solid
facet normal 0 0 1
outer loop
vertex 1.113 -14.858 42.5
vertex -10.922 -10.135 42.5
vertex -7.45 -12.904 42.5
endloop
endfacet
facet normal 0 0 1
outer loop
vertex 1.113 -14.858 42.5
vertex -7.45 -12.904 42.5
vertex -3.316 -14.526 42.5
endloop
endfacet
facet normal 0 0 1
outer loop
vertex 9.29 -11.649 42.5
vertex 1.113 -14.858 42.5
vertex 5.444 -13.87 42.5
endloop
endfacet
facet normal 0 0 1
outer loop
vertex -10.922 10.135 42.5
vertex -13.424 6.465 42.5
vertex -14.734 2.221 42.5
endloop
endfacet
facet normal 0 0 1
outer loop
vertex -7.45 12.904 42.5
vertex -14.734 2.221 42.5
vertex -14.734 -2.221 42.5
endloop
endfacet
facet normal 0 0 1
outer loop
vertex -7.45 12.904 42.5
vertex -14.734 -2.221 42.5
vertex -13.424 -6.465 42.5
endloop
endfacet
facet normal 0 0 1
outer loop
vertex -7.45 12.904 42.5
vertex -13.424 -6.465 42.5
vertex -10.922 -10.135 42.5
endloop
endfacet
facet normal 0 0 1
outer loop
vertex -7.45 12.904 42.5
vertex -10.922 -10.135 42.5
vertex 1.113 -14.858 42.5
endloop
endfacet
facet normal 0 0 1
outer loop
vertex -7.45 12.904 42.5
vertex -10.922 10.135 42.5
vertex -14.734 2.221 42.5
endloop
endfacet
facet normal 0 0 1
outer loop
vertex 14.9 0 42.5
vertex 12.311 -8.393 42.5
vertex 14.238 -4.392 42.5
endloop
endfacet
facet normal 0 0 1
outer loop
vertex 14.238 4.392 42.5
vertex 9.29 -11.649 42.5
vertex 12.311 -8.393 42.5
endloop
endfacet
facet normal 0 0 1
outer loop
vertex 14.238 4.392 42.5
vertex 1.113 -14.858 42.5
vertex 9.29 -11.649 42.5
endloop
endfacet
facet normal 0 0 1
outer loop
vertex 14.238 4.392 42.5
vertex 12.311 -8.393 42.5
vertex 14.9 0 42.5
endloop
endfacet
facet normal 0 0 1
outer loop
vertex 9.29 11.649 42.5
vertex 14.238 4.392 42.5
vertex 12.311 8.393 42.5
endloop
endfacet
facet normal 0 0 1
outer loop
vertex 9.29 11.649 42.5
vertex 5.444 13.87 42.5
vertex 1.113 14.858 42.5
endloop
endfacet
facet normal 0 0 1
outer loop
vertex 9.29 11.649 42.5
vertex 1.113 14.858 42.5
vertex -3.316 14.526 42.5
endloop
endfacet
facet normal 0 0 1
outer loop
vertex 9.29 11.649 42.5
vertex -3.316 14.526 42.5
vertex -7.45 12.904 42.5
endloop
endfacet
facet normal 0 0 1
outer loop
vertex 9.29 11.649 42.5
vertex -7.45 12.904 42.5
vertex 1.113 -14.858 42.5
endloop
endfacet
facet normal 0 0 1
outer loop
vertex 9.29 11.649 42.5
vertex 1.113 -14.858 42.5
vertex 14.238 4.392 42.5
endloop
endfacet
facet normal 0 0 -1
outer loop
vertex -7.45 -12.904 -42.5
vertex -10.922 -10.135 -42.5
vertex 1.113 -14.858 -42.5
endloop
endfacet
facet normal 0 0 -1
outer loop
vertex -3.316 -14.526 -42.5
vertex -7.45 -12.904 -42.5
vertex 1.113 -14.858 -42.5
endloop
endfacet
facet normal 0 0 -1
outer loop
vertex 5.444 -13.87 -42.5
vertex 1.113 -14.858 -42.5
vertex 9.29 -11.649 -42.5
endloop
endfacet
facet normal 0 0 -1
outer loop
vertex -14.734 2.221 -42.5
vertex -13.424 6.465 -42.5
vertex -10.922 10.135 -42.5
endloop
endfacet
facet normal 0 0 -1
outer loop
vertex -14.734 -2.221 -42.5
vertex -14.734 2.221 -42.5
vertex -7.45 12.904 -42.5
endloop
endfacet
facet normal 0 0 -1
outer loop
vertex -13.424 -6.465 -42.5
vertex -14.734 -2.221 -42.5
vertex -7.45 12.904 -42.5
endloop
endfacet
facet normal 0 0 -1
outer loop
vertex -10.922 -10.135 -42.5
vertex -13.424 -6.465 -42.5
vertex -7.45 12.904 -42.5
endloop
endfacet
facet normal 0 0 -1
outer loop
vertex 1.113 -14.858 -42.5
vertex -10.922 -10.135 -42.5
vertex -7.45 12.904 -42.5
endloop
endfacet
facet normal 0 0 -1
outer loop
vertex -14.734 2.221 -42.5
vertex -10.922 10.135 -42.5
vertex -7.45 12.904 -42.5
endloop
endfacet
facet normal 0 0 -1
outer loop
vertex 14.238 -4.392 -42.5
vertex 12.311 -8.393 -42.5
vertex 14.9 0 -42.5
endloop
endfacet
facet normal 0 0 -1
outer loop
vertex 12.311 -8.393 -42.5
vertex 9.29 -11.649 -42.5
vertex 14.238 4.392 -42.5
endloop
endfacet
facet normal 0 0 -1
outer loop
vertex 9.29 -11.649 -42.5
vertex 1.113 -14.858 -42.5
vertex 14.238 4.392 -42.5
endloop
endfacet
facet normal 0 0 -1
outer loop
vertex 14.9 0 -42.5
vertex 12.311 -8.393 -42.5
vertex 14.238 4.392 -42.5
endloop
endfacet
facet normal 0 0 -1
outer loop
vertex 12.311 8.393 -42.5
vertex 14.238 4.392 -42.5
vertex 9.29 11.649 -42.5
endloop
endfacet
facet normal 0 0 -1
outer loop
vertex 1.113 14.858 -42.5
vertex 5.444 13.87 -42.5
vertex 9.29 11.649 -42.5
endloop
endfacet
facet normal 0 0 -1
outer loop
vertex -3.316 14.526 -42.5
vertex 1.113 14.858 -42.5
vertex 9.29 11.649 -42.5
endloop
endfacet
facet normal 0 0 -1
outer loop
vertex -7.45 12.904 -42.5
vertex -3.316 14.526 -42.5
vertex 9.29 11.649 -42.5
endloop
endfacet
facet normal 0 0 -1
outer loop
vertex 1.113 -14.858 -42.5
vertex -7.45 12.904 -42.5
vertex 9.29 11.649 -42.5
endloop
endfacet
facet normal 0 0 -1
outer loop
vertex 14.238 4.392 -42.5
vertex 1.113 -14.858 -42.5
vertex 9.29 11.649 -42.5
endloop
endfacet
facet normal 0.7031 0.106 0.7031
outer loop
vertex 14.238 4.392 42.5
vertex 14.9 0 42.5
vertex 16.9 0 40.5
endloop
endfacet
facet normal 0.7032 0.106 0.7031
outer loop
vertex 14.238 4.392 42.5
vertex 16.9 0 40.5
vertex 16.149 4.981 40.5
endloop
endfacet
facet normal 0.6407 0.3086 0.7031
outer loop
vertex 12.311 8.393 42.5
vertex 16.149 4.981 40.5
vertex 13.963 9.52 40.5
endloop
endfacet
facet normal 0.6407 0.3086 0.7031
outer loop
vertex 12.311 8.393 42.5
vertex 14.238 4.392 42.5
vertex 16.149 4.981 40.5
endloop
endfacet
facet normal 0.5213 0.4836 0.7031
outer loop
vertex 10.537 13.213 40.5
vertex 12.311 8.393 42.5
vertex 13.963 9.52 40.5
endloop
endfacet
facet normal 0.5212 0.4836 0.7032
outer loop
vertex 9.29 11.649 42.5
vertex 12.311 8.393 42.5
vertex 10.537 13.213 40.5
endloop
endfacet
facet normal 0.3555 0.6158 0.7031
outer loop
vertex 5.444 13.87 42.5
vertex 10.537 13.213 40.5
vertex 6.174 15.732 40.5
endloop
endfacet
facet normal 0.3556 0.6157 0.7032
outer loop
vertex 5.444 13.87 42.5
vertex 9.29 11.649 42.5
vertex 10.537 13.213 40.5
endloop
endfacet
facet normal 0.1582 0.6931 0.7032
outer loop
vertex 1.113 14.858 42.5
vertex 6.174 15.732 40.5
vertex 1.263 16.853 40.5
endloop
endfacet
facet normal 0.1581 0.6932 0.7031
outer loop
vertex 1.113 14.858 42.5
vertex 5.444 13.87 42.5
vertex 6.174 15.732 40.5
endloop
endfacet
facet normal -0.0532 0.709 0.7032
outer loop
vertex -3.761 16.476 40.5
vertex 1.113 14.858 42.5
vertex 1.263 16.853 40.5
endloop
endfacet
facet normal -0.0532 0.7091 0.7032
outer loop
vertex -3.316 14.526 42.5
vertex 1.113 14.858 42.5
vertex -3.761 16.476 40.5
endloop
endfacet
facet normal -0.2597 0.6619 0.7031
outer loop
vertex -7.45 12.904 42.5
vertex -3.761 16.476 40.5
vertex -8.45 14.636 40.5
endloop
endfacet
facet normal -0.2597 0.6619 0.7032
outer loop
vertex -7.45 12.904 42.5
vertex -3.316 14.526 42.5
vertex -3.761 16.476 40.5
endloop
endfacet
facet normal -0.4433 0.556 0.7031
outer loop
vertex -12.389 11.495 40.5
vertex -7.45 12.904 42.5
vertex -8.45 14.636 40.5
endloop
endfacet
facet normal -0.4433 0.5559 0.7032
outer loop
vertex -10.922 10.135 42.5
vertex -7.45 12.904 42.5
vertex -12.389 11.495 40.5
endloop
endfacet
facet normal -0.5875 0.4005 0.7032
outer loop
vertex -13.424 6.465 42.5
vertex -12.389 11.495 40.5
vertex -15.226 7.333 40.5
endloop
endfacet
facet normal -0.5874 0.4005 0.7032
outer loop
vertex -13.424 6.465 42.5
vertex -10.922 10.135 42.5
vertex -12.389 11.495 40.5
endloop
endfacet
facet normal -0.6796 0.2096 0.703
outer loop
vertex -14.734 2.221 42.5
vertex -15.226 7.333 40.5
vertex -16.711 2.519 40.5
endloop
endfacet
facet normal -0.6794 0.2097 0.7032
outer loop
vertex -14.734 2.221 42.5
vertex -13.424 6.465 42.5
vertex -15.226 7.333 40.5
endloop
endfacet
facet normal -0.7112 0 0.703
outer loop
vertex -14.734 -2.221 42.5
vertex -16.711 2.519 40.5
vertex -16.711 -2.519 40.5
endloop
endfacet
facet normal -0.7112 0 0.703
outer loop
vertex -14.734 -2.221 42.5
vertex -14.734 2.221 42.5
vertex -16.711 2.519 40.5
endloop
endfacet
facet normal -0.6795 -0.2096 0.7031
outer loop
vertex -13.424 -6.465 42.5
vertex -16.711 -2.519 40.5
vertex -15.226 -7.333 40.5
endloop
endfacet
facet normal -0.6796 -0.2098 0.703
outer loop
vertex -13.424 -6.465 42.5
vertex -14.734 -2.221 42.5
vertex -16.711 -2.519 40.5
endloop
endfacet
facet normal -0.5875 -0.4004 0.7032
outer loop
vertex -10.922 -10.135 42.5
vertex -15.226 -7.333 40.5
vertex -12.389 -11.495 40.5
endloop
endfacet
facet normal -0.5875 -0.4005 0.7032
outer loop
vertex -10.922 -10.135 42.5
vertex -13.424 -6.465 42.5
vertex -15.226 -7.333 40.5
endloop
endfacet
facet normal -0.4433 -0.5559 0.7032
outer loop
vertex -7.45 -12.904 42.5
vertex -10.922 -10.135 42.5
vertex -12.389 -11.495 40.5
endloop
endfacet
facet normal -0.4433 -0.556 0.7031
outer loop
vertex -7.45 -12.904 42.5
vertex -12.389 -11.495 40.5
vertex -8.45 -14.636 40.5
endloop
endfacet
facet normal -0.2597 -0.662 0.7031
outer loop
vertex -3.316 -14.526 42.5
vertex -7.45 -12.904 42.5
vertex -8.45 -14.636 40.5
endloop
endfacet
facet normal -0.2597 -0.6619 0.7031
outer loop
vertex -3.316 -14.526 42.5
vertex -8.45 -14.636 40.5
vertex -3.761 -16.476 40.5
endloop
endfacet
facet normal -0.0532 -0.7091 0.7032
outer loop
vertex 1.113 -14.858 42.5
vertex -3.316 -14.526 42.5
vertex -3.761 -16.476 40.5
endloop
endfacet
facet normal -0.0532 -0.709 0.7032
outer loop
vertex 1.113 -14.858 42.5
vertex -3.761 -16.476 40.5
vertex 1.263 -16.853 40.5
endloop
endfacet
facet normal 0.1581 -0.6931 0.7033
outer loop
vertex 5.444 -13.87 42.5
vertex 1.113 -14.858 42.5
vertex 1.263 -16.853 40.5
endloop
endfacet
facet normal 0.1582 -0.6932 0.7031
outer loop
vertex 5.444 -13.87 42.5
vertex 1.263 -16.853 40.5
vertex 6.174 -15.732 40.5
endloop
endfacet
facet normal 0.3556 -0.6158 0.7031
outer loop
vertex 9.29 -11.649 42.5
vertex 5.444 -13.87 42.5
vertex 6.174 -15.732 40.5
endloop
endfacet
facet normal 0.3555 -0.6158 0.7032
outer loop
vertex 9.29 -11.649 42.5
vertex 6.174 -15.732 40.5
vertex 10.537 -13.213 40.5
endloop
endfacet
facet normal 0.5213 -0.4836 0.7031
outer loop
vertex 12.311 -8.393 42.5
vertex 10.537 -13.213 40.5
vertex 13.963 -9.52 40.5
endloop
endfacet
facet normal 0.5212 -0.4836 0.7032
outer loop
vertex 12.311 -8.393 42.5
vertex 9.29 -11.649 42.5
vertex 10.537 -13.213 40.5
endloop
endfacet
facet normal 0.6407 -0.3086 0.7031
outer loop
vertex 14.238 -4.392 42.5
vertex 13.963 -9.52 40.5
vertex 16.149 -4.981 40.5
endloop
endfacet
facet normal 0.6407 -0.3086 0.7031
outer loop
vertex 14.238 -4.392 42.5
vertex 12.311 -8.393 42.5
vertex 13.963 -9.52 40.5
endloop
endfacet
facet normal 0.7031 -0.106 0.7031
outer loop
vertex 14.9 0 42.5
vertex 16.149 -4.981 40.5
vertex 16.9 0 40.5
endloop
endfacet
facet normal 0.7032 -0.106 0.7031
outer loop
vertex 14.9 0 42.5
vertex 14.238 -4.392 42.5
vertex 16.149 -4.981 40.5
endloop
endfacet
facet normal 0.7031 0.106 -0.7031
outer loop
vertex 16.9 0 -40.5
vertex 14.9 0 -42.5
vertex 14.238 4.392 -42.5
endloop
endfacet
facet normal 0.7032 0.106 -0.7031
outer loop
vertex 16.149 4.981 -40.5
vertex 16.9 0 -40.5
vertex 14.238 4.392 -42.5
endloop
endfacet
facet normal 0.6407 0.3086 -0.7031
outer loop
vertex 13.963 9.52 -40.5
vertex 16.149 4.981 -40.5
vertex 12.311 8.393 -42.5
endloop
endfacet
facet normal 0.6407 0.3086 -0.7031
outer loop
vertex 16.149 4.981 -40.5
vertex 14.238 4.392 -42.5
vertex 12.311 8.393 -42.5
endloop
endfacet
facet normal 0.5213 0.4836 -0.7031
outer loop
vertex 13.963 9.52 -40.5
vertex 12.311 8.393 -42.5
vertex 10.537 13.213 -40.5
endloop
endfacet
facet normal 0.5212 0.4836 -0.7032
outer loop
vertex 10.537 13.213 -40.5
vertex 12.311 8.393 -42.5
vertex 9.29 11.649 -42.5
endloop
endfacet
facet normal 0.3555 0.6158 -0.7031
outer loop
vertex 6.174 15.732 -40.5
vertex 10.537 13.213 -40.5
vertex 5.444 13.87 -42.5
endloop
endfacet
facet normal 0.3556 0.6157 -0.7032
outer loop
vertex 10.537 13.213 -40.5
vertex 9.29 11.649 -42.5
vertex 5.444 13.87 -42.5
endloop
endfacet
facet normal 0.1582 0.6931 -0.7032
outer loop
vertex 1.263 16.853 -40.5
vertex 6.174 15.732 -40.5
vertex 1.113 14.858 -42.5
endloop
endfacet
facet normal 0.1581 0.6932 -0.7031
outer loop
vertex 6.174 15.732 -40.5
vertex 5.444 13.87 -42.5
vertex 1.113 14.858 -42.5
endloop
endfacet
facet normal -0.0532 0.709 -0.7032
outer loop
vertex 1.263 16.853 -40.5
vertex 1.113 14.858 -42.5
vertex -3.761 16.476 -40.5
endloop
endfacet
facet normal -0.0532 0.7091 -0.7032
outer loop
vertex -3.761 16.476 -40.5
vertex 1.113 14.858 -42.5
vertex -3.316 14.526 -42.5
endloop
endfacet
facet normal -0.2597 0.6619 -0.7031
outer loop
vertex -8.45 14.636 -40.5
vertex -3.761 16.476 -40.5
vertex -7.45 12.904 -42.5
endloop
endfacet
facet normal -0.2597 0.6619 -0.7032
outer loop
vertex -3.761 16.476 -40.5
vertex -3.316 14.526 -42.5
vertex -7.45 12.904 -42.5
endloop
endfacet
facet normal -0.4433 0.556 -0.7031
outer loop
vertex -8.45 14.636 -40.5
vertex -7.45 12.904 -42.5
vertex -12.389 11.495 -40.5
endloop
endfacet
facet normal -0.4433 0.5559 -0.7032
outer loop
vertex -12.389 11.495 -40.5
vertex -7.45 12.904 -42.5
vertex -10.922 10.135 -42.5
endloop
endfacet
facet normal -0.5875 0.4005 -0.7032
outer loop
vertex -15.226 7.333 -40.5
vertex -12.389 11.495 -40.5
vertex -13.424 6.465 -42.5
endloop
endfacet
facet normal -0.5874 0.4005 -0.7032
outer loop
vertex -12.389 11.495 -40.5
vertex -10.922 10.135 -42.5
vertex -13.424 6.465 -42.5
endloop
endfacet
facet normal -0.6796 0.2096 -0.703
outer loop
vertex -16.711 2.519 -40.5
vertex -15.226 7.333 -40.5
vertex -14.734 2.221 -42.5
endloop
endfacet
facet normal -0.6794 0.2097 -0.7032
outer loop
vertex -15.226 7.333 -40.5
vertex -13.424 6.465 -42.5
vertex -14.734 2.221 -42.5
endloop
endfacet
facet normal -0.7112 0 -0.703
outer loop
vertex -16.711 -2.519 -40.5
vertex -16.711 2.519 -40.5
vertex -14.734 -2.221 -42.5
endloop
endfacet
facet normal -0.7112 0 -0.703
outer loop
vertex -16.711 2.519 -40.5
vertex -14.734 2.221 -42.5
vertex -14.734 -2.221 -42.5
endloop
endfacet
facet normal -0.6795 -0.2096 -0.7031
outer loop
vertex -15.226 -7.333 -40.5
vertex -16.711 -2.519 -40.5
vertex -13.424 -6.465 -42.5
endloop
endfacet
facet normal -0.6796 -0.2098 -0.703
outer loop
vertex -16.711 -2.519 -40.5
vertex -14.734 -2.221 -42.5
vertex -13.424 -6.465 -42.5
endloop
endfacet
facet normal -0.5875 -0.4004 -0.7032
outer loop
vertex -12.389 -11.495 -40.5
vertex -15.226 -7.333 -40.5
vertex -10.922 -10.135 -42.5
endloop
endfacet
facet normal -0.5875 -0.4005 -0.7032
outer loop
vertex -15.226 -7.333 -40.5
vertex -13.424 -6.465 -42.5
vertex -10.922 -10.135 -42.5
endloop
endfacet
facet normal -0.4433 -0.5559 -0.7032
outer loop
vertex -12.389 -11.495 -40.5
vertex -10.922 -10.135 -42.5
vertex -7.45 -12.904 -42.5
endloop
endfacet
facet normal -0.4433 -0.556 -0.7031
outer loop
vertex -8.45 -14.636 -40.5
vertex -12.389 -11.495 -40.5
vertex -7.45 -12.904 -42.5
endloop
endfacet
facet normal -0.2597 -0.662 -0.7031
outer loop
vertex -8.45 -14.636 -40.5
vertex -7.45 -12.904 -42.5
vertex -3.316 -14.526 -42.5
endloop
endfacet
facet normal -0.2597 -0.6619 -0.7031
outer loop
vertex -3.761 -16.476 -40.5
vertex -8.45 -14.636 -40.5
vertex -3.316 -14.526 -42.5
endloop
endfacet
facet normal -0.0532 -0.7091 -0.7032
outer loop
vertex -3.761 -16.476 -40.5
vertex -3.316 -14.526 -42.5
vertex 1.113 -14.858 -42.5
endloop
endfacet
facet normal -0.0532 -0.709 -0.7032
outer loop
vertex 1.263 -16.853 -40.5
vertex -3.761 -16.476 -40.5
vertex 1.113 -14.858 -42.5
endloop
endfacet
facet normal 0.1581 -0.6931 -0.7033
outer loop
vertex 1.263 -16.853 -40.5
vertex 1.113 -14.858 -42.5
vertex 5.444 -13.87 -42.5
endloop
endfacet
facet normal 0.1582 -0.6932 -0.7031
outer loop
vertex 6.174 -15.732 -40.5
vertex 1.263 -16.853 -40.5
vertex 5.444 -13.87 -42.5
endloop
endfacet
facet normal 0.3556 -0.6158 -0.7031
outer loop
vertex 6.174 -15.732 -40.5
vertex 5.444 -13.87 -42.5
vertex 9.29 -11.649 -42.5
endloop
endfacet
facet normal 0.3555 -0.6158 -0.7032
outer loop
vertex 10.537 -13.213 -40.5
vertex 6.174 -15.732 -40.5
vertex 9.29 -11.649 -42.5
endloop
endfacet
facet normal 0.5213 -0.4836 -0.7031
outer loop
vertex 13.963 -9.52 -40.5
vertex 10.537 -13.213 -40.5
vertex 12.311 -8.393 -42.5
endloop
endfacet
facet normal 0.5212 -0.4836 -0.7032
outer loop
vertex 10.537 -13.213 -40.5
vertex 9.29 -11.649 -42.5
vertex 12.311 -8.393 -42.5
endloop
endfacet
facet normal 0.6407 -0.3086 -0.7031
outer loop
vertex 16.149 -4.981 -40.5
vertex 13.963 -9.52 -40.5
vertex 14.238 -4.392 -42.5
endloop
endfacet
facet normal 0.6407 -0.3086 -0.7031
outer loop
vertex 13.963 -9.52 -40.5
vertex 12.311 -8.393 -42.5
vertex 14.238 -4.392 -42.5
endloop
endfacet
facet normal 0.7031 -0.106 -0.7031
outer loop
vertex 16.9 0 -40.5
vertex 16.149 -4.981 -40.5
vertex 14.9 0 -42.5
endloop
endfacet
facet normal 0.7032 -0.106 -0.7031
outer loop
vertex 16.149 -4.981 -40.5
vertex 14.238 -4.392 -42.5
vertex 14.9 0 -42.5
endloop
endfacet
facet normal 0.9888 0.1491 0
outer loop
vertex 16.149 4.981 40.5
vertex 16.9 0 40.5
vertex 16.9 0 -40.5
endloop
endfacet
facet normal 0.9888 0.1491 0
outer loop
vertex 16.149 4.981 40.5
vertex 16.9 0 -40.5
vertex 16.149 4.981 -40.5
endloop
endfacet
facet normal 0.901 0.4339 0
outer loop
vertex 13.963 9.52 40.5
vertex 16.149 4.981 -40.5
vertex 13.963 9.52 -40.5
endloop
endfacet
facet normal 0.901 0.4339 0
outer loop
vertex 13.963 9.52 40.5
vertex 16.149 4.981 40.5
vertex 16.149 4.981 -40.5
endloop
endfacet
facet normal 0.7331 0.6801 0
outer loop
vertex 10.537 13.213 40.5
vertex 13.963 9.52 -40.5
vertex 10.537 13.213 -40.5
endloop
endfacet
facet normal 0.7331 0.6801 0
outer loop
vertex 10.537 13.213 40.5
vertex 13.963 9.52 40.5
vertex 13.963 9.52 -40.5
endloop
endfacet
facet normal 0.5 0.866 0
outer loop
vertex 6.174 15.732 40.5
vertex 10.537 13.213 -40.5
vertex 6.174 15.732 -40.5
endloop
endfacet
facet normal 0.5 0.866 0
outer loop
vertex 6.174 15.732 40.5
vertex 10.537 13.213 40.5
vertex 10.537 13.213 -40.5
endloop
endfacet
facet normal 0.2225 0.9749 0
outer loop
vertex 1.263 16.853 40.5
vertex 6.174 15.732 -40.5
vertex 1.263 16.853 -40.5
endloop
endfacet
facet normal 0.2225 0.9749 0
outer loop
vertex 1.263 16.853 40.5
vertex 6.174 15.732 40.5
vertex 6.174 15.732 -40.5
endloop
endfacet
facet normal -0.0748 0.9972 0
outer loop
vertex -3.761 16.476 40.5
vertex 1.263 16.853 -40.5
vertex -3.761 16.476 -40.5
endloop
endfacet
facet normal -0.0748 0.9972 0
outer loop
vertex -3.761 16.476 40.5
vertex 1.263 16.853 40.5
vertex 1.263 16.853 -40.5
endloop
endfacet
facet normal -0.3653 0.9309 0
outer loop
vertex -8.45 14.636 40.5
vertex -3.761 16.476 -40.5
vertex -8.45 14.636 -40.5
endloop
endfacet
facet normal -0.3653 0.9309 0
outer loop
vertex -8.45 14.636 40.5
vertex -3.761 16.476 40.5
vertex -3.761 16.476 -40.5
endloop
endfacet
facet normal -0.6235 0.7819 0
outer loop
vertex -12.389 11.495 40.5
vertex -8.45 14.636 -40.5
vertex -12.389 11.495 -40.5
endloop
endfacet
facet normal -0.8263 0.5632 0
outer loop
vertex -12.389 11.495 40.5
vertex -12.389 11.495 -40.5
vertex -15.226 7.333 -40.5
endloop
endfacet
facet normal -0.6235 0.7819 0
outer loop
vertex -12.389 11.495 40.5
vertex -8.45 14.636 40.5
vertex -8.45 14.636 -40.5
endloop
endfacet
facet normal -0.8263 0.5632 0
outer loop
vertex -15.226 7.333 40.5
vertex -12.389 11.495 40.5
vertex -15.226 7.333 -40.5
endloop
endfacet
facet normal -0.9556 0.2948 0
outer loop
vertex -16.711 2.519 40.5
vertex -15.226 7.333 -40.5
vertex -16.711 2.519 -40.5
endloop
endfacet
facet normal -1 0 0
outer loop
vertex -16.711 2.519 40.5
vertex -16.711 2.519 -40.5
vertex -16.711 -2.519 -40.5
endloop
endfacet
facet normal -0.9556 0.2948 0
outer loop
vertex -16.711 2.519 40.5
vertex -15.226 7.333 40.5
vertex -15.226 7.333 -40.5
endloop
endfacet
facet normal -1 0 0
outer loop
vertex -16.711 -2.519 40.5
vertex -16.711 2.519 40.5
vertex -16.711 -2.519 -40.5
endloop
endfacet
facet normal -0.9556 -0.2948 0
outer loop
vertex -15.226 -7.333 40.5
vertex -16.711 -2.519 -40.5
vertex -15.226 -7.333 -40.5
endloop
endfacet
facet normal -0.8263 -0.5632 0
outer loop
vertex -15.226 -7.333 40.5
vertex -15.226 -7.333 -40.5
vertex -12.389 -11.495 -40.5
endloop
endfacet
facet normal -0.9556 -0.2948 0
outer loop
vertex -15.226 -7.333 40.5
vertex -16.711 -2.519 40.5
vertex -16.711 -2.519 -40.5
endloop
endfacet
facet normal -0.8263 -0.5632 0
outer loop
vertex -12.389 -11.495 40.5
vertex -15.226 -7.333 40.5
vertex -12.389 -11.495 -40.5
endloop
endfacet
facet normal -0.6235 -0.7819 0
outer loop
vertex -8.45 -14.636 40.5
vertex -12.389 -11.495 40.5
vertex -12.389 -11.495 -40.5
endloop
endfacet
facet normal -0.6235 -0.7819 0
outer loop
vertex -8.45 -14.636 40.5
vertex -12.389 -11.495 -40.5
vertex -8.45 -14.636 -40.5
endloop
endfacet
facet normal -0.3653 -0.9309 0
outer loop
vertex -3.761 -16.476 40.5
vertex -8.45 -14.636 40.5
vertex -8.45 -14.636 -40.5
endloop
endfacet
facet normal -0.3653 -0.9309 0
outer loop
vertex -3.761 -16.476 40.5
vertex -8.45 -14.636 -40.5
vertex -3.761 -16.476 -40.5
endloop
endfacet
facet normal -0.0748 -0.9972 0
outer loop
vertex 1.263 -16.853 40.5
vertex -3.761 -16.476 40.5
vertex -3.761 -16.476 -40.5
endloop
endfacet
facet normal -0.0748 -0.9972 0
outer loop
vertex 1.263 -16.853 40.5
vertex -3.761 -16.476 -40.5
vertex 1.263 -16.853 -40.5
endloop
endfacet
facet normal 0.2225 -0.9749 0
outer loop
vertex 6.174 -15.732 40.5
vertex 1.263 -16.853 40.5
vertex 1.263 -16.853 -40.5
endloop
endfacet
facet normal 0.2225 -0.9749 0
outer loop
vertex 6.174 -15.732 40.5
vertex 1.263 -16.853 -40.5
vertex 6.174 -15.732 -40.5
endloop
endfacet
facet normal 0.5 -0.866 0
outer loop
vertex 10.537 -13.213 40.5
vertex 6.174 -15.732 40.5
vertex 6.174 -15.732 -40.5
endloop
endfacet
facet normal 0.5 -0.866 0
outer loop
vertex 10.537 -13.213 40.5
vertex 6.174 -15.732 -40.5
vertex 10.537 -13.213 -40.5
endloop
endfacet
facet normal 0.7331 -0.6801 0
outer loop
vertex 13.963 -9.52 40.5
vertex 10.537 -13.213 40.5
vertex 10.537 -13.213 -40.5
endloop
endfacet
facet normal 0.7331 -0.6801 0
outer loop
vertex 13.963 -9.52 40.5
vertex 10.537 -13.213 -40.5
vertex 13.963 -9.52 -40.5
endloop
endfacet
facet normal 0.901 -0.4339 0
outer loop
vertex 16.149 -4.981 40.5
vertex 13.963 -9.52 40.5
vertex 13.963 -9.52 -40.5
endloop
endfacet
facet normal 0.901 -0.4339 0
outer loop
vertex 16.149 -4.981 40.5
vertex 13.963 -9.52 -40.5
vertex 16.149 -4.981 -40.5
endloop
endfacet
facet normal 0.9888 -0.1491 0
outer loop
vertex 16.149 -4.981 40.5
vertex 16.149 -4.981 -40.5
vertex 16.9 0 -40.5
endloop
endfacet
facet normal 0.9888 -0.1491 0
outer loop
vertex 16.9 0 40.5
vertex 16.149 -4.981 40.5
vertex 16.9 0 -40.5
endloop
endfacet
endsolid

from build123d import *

# Parameters (mm, degrees)
SKETCH1_R           = 16.9
BOSS_EXTRUDE1_DEPTH = 42.5
CHAMFER1_SIZE       = 2
CHAMFER2_SIZE       = 2


with BuildPart() as part:
    # Sketch1 → Boss-Extrude1 (new, symmetric)
    with BuildSketch(Plane.XY):
        Circle(SKETCH1_R)
    extrude(amount=BOSS_EXTRUDE1_DEPTH, both=True)

    # Chamfer1
    chamfer1_edges = [part.edges().sort_by_distance(p)[0] for p in [
        (-16.9, 0, 42.5),
    ]]
    chamfer(chamfer1_edges, length=CHAMFER1_SIZE)

    # Chamfer2
    chamfer2_edges = [part.edges().sort_by_distance(p)[0] for p in [
        (-16.9, 0, -42.5),
    ]]
    chamfer(chamfer2_edges, length=CHAMFER2_SIZE)


solid = part.part
